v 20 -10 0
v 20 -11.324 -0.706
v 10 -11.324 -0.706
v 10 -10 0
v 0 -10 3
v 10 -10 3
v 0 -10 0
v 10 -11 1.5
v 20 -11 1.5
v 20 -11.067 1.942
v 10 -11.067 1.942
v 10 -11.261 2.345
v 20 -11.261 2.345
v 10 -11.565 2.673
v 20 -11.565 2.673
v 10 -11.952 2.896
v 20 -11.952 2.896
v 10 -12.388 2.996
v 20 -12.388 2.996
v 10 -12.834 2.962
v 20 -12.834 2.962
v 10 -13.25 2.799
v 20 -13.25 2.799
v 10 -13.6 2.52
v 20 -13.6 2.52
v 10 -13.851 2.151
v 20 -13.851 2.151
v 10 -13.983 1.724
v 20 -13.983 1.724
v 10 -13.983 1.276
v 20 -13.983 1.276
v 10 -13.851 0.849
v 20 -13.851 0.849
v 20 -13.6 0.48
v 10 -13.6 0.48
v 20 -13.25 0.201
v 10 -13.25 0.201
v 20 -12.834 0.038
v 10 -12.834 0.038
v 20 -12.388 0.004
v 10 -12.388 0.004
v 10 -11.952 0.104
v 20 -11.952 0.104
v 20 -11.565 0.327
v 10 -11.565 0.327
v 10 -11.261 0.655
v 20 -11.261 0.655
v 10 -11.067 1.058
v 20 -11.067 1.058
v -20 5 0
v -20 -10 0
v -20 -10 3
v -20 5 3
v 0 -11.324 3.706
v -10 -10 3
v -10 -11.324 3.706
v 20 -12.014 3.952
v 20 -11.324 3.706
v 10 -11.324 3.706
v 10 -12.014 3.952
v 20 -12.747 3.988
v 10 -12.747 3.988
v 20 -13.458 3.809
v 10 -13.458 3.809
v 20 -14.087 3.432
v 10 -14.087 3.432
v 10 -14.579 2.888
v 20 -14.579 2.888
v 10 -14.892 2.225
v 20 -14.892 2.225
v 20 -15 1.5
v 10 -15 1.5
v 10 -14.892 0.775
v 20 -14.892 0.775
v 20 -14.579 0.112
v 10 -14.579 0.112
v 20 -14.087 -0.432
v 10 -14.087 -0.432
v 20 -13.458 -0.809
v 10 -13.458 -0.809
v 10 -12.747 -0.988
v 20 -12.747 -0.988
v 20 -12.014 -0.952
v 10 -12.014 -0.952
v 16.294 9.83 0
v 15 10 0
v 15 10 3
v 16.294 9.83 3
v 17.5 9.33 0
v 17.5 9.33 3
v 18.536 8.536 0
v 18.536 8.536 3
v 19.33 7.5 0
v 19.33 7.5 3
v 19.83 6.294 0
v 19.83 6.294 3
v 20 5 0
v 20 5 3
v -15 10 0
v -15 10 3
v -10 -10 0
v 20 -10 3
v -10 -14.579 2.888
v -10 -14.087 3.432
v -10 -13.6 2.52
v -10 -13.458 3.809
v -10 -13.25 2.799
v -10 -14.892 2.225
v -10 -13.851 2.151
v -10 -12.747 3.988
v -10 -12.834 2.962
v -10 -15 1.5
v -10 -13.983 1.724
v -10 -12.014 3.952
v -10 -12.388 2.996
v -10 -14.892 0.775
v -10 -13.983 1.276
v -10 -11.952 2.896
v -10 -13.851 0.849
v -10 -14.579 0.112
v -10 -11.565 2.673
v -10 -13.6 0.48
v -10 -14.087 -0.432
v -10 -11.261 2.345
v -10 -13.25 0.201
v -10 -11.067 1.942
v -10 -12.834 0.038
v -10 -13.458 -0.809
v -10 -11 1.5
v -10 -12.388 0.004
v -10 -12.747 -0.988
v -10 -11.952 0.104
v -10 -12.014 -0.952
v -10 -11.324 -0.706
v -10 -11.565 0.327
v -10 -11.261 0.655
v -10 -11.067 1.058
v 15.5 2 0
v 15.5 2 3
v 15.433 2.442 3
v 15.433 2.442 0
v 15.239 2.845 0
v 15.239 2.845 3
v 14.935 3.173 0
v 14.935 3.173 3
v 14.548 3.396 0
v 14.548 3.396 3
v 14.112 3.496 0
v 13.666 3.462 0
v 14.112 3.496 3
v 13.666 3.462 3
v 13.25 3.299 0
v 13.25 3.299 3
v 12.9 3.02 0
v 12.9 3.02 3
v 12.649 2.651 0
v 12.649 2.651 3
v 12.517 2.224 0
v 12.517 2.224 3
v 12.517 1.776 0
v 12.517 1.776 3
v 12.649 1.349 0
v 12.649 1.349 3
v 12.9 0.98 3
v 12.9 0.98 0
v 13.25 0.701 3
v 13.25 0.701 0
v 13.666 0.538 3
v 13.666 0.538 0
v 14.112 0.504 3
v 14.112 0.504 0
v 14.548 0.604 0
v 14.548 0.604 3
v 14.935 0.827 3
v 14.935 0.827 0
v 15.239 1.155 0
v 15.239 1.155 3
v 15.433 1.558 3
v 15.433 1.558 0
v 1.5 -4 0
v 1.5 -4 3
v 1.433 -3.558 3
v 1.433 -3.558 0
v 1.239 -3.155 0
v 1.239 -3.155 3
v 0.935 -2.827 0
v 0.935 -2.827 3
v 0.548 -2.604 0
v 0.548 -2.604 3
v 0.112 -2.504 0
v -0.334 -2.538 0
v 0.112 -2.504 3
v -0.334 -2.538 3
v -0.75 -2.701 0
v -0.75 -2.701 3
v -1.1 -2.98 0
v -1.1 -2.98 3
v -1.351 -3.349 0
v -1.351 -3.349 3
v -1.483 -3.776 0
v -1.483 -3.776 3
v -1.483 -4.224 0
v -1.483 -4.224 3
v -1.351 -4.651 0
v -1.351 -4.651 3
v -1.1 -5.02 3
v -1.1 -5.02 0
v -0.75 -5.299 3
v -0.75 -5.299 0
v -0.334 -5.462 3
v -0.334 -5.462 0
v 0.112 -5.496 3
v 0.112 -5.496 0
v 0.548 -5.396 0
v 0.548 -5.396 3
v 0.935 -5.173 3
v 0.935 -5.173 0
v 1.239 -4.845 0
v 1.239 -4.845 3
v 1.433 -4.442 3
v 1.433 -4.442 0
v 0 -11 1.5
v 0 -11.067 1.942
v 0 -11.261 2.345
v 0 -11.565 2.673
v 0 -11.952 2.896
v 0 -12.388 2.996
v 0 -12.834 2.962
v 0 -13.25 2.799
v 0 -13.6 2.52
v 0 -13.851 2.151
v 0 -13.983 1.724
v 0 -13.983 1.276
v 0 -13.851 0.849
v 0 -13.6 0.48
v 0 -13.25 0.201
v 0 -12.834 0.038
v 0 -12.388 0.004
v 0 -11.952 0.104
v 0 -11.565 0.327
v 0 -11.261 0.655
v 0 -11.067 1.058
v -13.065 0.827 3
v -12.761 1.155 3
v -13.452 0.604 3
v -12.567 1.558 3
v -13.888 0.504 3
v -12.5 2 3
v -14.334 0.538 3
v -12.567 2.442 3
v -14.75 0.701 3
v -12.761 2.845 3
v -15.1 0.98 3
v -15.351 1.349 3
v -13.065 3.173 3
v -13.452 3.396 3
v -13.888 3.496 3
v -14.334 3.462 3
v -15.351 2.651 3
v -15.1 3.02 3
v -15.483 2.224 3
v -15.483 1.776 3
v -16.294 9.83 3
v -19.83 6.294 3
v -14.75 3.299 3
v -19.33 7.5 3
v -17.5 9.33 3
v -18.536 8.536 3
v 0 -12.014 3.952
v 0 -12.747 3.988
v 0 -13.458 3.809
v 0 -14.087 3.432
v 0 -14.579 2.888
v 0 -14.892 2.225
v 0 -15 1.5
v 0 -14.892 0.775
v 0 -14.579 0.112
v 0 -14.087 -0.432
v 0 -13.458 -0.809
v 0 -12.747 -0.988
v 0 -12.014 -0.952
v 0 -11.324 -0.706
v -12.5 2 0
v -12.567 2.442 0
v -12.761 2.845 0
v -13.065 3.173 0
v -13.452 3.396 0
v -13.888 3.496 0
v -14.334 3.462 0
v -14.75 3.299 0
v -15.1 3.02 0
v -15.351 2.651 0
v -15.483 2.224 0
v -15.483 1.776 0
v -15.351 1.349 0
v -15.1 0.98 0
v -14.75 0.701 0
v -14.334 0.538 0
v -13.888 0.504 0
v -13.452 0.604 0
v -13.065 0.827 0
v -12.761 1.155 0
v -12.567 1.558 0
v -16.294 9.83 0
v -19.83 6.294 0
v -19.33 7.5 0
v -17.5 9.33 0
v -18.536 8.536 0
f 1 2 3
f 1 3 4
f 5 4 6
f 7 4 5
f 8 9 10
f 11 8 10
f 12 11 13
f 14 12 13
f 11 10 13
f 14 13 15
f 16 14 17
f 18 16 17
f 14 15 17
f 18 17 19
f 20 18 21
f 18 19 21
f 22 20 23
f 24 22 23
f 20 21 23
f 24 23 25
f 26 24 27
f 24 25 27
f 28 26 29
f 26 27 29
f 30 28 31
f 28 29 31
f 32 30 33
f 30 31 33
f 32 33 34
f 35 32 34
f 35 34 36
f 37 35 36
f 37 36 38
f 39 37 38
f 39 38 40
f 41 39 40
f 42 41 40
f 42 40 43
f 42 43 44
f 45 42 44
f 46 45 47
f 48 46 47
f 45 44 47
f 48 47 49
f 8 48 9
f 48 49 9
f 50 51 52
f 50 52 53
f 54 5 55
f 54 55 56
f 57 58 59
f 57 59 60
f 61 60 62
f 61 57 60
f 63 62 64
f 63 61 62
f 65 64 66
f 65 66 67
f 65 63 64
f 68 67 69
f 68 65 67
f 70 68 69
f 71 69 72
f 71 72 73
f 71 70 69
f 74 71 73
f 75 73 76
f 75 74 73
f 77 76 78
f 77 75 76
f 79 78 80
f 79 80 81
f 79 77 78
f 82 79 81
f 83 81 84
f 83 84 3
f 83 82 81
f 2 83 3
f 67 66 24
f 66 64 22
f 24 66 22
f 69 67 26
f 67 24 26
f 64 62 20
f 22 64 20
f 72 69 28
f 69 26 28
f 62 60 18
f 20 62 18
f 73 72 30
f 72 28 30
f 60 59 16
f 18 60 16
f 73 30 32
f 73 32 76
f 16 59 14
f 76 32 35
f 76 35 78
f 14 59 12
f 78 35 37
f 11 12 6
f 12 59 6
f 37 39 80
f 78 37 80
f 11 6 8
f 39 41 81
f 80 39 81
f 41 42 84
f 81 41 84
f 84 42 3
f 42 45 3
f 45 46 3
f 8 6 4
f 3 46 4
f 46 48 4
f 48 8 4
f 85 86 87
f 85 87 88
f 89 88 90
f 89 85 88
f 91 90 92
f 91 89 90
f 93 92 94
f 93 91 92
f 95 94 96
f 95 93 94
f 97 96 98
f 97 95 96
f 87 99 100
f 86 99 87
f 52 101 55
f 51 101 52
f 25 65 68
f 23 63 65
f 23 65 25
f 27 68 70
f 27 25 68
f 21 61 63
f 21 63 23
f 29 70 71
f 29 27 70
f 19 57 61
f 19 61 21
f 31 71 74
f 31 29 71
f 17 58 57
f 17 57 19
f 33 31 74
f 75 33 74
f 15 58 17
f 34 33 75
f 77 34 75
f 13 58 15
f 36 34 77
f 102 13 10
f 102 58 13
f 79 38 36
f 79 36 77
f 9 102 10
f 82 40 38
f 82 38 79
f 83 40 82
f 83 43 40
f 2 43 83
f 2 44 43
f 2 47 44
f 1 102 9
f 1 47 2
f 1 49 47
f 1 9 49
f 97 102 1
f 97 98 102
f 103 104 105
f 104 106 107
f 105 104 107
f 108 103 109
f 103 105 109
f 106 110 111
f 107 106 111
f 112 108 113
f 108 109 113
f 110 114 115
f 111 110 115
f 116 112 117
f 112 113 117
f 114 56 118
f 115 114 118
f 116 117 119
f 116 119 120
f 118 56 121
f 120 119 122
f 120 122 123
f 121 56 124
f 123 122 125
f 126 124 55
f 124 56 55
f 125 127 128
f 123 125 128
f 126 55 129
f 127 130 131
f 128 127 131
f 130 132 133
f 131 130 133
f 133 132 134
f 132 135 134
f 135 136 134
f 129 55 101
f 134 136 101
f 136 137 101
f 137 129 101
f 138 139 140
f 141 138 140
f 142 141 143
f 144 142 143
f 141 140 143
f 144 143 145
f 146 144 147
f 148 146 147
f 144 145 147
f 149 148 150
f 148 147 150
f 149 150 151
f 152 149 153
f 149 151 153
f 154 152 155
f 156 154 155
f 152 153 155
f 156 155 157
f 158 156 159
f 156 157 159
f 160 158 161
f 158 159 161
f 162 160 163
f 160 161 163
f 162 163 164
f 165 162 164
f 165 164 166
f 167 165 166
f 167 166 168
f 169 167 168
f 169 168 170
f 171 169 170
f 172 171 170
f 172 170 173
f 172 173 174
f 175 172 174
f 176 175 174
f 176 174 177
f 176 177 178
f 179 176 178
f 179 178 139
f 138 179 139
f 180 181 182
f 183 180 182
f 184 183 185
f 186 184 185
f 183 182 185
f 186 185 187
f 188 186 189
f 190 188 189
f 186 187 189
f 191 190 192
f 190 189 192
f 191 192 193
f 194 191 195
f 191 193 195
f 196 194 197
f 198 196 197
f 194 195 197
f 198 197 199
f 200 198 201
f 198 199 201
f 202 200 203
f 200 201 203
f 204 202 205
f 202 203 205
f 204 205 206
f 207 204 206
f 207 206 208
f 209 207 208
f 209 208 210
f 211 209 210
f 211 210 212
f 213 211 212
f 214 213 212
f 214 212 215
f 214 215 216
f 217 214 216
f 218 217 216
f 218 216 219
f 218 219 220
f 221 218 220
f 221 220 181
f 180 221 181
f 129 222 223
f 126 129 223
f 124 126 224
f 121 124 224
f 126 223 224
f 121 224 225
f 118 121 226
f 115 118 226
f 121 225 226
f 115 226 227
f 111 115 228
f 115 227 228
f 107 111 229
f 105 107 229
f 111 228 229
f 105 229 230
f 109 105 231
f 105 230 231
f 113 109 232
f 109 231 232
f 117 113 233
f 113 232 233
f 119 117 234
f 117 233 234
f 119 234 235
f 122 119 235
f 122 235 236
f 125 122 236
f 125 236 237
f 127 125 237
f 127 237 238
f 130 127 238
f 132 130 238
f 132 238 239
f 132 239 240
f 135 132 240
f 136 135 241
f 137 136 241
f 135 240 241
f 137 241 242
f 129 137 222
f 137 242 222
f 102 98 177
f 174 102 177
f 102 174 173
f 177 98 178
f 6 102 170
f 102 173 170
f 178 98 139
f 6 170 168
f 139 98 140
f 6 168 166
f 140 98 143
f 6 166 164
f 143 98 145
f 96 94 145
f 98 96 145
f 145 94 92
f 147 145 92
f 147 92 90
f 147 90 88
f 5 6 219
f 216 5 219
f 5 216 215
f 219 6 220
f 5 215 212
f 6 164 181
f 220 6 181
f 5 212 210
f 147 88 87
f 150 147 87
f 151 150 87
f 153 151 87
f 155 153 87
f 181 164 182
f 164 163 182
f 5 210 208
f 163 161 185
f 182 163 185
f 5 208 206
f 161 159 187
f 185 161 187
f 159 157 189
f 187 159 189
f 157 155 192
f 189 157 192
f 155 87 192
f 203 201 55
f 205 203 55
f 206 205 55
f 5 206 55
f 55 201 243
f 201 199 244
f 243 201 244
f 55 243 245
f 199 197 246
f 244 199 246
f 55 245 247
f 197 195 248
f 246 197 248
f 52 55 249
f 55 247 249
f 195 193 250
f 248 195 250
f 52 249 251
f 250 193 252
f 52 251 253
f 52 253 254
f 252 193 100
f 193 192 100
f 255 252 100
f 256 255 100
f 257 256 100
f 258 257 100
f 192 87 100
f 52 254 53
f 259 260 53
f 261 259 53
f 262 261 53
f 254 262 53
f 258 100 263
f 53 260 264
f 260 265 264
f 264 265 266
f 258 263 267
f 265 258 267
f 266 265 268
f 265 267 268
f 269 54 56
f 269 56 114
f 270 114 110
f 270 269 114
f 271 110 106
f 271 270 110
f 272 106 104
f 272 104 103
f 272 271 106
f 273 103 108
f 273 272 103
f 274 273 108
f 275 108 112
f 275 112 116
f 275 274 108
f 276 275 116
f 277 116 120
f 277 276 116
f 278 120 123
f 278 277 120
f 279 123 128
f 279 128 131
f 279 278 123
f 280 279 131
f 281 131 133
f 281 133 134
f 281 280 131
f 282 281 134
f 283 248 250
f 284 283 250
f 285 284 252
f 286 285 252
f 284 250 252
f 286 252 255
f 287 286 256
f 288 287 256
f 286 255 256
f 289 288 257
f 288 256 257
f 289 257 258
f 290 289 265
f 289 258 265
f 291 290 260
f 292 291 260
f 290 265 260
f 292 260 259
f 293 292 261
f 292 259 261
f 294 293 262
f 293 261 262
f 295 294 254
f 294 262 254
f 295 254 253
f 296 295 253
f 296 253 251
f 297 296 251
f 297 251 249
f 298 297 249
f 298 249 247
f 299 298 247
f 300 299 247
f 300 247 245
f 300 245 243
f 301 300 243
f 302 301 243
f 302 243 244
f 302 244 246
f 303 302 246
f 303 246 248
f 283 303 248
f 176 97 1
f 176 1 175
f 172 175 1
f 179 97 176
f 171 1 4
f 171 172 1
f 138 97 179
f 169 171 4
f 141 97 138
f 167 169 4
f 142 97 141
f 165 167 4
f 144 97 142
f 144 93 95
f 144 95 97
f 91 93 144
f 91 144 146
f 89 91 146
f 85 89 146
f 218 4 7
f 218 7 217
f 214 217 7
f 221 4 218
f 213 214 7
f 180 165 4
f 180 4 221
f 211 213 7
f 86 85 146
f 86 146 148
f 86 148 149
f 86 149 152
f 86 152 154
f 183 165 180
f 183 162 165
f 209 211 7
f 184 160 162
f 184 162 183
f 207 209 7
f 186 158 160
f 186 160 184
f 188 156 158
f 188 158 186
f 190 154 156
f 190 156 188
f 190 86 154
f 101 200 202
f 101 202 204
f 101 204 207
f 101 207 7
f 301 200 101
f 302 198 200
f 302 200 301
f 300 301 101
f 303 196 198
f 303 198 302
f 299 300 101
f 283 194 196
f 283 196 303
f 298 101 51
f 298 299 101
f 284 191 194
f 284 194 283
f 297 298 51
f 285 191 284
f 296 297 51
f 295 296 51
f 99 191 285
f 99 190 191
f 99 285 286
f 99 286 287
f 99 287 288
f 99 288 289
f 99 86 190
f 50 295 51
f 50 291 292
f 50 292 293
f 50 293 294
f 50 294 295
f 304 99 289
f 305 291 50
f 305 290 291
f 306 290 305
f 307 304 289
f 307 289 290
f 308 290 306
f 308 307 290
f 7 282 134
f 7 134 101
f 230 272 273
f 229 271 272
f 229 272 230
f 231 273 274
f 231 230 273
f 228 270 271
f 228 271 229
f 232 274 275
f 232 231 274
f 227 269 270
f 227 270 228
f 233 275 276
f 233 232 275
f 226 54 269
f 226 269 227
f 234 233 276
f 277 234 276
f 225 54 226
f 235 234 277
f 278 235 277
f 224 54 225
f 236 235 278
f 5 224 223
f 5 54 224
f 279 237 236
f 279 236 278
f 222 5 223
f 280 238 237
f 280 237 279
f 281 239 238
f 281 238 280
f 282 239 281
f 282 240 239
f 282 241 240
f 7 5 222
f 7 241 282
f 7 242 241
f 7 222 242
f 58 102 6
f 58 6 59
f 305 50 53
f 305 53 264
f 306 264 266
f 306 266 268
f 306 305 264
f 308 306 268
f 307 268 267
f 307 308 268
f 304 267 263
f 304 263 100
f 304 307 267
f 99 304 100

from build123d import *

# Parameters (mm, degrees)
BOSS_EXTRU_1_DEPTH         = 3
ESQUISSE2_R                = 1.5
BOSS_EXTRU_2_DEPTH         = 10
R_P_TITION_LIN_AIRE1_COUNT = 2
R_P_TITION_LIN_AIRE1_PITCH = 20
ESQUISSE3_R                = 1.5
ENL_V_MAT_EXTRU_1_DEPTH    = 10


with BuildPart() as part:
    # Esquisse1 → Boss.-Extru.1 (new body)
    with BuildSketch(Plane.XY):
        with BuildLine():
            Line((-15, 10), (15, 10))
            ThreePointArc((15, 10), (18.535533906, 8.535533906), (20, 5))
            Line((20, 5), (20, -10))
            Line((20, -10), (-20, -10))
            Line((-20, -10), (-20, 5))
            ThreePointArc((-20, 5), (-18.535533906, 8.535533906), (-15, 10))
        make_face()
    extrude(amount=BOSS_EXTRU_1_DEPTH)

    # Esquisse2 → Boss.-Extru.2 (add)
    with BuildSketch(Plane(origin=(20, 0, 0), x_dir=(0, 0, -1), z_dir=(1, 0, 0))):
        with BuildLine():
            Line((-3, -10), (-3.705882353, -11.323529412))
            ThreePointArc((-3.705882353, -11.323529412), (-1.5, -15), (0.705882353, -11.323529412))
            Line((0.705882353, -11.323529412), (0, -10))
            Line((0, -10), (-3, -10))
        make_face()
        with Locations(Location((-1.5, -12.5, 0), (0, 0, 90))):
            Circle(ESQUISSE2_R, mode=Mode.SUBTRACT)
    boss_extru_2 = extrude(amount=-BOSS_EXTRU_2_DEPTH)

    # Répétition linéaire1: Boss.-Extru.2 ×2
    with Locations(*[(-i * R_P_TITION_LIN_AIRE1_PITCH, 0, 0) for i in range(1, R_P_TITION_LIN_AIRE1_COUNT)]):
        add(boss_extru_2)

    # Esquisse3 → Enlèv. mat.-Extru.1 (cut)
    with BuildSketch(Plane.XY.offset(3)):
        with Locations((0, -4)):
            Circle(ESQUISSE3_R)
        with Locations((-14, 2)):
            Circle(ESQUISSE3_R)
        with Locations((14, 2)):
            Circle(ESQUISSE3_R)
    extrude(amount=-ENL_V_MAT_EXTRU_1_DEPTH, mode=Mode.SUBTRACT)


solid = part.part
